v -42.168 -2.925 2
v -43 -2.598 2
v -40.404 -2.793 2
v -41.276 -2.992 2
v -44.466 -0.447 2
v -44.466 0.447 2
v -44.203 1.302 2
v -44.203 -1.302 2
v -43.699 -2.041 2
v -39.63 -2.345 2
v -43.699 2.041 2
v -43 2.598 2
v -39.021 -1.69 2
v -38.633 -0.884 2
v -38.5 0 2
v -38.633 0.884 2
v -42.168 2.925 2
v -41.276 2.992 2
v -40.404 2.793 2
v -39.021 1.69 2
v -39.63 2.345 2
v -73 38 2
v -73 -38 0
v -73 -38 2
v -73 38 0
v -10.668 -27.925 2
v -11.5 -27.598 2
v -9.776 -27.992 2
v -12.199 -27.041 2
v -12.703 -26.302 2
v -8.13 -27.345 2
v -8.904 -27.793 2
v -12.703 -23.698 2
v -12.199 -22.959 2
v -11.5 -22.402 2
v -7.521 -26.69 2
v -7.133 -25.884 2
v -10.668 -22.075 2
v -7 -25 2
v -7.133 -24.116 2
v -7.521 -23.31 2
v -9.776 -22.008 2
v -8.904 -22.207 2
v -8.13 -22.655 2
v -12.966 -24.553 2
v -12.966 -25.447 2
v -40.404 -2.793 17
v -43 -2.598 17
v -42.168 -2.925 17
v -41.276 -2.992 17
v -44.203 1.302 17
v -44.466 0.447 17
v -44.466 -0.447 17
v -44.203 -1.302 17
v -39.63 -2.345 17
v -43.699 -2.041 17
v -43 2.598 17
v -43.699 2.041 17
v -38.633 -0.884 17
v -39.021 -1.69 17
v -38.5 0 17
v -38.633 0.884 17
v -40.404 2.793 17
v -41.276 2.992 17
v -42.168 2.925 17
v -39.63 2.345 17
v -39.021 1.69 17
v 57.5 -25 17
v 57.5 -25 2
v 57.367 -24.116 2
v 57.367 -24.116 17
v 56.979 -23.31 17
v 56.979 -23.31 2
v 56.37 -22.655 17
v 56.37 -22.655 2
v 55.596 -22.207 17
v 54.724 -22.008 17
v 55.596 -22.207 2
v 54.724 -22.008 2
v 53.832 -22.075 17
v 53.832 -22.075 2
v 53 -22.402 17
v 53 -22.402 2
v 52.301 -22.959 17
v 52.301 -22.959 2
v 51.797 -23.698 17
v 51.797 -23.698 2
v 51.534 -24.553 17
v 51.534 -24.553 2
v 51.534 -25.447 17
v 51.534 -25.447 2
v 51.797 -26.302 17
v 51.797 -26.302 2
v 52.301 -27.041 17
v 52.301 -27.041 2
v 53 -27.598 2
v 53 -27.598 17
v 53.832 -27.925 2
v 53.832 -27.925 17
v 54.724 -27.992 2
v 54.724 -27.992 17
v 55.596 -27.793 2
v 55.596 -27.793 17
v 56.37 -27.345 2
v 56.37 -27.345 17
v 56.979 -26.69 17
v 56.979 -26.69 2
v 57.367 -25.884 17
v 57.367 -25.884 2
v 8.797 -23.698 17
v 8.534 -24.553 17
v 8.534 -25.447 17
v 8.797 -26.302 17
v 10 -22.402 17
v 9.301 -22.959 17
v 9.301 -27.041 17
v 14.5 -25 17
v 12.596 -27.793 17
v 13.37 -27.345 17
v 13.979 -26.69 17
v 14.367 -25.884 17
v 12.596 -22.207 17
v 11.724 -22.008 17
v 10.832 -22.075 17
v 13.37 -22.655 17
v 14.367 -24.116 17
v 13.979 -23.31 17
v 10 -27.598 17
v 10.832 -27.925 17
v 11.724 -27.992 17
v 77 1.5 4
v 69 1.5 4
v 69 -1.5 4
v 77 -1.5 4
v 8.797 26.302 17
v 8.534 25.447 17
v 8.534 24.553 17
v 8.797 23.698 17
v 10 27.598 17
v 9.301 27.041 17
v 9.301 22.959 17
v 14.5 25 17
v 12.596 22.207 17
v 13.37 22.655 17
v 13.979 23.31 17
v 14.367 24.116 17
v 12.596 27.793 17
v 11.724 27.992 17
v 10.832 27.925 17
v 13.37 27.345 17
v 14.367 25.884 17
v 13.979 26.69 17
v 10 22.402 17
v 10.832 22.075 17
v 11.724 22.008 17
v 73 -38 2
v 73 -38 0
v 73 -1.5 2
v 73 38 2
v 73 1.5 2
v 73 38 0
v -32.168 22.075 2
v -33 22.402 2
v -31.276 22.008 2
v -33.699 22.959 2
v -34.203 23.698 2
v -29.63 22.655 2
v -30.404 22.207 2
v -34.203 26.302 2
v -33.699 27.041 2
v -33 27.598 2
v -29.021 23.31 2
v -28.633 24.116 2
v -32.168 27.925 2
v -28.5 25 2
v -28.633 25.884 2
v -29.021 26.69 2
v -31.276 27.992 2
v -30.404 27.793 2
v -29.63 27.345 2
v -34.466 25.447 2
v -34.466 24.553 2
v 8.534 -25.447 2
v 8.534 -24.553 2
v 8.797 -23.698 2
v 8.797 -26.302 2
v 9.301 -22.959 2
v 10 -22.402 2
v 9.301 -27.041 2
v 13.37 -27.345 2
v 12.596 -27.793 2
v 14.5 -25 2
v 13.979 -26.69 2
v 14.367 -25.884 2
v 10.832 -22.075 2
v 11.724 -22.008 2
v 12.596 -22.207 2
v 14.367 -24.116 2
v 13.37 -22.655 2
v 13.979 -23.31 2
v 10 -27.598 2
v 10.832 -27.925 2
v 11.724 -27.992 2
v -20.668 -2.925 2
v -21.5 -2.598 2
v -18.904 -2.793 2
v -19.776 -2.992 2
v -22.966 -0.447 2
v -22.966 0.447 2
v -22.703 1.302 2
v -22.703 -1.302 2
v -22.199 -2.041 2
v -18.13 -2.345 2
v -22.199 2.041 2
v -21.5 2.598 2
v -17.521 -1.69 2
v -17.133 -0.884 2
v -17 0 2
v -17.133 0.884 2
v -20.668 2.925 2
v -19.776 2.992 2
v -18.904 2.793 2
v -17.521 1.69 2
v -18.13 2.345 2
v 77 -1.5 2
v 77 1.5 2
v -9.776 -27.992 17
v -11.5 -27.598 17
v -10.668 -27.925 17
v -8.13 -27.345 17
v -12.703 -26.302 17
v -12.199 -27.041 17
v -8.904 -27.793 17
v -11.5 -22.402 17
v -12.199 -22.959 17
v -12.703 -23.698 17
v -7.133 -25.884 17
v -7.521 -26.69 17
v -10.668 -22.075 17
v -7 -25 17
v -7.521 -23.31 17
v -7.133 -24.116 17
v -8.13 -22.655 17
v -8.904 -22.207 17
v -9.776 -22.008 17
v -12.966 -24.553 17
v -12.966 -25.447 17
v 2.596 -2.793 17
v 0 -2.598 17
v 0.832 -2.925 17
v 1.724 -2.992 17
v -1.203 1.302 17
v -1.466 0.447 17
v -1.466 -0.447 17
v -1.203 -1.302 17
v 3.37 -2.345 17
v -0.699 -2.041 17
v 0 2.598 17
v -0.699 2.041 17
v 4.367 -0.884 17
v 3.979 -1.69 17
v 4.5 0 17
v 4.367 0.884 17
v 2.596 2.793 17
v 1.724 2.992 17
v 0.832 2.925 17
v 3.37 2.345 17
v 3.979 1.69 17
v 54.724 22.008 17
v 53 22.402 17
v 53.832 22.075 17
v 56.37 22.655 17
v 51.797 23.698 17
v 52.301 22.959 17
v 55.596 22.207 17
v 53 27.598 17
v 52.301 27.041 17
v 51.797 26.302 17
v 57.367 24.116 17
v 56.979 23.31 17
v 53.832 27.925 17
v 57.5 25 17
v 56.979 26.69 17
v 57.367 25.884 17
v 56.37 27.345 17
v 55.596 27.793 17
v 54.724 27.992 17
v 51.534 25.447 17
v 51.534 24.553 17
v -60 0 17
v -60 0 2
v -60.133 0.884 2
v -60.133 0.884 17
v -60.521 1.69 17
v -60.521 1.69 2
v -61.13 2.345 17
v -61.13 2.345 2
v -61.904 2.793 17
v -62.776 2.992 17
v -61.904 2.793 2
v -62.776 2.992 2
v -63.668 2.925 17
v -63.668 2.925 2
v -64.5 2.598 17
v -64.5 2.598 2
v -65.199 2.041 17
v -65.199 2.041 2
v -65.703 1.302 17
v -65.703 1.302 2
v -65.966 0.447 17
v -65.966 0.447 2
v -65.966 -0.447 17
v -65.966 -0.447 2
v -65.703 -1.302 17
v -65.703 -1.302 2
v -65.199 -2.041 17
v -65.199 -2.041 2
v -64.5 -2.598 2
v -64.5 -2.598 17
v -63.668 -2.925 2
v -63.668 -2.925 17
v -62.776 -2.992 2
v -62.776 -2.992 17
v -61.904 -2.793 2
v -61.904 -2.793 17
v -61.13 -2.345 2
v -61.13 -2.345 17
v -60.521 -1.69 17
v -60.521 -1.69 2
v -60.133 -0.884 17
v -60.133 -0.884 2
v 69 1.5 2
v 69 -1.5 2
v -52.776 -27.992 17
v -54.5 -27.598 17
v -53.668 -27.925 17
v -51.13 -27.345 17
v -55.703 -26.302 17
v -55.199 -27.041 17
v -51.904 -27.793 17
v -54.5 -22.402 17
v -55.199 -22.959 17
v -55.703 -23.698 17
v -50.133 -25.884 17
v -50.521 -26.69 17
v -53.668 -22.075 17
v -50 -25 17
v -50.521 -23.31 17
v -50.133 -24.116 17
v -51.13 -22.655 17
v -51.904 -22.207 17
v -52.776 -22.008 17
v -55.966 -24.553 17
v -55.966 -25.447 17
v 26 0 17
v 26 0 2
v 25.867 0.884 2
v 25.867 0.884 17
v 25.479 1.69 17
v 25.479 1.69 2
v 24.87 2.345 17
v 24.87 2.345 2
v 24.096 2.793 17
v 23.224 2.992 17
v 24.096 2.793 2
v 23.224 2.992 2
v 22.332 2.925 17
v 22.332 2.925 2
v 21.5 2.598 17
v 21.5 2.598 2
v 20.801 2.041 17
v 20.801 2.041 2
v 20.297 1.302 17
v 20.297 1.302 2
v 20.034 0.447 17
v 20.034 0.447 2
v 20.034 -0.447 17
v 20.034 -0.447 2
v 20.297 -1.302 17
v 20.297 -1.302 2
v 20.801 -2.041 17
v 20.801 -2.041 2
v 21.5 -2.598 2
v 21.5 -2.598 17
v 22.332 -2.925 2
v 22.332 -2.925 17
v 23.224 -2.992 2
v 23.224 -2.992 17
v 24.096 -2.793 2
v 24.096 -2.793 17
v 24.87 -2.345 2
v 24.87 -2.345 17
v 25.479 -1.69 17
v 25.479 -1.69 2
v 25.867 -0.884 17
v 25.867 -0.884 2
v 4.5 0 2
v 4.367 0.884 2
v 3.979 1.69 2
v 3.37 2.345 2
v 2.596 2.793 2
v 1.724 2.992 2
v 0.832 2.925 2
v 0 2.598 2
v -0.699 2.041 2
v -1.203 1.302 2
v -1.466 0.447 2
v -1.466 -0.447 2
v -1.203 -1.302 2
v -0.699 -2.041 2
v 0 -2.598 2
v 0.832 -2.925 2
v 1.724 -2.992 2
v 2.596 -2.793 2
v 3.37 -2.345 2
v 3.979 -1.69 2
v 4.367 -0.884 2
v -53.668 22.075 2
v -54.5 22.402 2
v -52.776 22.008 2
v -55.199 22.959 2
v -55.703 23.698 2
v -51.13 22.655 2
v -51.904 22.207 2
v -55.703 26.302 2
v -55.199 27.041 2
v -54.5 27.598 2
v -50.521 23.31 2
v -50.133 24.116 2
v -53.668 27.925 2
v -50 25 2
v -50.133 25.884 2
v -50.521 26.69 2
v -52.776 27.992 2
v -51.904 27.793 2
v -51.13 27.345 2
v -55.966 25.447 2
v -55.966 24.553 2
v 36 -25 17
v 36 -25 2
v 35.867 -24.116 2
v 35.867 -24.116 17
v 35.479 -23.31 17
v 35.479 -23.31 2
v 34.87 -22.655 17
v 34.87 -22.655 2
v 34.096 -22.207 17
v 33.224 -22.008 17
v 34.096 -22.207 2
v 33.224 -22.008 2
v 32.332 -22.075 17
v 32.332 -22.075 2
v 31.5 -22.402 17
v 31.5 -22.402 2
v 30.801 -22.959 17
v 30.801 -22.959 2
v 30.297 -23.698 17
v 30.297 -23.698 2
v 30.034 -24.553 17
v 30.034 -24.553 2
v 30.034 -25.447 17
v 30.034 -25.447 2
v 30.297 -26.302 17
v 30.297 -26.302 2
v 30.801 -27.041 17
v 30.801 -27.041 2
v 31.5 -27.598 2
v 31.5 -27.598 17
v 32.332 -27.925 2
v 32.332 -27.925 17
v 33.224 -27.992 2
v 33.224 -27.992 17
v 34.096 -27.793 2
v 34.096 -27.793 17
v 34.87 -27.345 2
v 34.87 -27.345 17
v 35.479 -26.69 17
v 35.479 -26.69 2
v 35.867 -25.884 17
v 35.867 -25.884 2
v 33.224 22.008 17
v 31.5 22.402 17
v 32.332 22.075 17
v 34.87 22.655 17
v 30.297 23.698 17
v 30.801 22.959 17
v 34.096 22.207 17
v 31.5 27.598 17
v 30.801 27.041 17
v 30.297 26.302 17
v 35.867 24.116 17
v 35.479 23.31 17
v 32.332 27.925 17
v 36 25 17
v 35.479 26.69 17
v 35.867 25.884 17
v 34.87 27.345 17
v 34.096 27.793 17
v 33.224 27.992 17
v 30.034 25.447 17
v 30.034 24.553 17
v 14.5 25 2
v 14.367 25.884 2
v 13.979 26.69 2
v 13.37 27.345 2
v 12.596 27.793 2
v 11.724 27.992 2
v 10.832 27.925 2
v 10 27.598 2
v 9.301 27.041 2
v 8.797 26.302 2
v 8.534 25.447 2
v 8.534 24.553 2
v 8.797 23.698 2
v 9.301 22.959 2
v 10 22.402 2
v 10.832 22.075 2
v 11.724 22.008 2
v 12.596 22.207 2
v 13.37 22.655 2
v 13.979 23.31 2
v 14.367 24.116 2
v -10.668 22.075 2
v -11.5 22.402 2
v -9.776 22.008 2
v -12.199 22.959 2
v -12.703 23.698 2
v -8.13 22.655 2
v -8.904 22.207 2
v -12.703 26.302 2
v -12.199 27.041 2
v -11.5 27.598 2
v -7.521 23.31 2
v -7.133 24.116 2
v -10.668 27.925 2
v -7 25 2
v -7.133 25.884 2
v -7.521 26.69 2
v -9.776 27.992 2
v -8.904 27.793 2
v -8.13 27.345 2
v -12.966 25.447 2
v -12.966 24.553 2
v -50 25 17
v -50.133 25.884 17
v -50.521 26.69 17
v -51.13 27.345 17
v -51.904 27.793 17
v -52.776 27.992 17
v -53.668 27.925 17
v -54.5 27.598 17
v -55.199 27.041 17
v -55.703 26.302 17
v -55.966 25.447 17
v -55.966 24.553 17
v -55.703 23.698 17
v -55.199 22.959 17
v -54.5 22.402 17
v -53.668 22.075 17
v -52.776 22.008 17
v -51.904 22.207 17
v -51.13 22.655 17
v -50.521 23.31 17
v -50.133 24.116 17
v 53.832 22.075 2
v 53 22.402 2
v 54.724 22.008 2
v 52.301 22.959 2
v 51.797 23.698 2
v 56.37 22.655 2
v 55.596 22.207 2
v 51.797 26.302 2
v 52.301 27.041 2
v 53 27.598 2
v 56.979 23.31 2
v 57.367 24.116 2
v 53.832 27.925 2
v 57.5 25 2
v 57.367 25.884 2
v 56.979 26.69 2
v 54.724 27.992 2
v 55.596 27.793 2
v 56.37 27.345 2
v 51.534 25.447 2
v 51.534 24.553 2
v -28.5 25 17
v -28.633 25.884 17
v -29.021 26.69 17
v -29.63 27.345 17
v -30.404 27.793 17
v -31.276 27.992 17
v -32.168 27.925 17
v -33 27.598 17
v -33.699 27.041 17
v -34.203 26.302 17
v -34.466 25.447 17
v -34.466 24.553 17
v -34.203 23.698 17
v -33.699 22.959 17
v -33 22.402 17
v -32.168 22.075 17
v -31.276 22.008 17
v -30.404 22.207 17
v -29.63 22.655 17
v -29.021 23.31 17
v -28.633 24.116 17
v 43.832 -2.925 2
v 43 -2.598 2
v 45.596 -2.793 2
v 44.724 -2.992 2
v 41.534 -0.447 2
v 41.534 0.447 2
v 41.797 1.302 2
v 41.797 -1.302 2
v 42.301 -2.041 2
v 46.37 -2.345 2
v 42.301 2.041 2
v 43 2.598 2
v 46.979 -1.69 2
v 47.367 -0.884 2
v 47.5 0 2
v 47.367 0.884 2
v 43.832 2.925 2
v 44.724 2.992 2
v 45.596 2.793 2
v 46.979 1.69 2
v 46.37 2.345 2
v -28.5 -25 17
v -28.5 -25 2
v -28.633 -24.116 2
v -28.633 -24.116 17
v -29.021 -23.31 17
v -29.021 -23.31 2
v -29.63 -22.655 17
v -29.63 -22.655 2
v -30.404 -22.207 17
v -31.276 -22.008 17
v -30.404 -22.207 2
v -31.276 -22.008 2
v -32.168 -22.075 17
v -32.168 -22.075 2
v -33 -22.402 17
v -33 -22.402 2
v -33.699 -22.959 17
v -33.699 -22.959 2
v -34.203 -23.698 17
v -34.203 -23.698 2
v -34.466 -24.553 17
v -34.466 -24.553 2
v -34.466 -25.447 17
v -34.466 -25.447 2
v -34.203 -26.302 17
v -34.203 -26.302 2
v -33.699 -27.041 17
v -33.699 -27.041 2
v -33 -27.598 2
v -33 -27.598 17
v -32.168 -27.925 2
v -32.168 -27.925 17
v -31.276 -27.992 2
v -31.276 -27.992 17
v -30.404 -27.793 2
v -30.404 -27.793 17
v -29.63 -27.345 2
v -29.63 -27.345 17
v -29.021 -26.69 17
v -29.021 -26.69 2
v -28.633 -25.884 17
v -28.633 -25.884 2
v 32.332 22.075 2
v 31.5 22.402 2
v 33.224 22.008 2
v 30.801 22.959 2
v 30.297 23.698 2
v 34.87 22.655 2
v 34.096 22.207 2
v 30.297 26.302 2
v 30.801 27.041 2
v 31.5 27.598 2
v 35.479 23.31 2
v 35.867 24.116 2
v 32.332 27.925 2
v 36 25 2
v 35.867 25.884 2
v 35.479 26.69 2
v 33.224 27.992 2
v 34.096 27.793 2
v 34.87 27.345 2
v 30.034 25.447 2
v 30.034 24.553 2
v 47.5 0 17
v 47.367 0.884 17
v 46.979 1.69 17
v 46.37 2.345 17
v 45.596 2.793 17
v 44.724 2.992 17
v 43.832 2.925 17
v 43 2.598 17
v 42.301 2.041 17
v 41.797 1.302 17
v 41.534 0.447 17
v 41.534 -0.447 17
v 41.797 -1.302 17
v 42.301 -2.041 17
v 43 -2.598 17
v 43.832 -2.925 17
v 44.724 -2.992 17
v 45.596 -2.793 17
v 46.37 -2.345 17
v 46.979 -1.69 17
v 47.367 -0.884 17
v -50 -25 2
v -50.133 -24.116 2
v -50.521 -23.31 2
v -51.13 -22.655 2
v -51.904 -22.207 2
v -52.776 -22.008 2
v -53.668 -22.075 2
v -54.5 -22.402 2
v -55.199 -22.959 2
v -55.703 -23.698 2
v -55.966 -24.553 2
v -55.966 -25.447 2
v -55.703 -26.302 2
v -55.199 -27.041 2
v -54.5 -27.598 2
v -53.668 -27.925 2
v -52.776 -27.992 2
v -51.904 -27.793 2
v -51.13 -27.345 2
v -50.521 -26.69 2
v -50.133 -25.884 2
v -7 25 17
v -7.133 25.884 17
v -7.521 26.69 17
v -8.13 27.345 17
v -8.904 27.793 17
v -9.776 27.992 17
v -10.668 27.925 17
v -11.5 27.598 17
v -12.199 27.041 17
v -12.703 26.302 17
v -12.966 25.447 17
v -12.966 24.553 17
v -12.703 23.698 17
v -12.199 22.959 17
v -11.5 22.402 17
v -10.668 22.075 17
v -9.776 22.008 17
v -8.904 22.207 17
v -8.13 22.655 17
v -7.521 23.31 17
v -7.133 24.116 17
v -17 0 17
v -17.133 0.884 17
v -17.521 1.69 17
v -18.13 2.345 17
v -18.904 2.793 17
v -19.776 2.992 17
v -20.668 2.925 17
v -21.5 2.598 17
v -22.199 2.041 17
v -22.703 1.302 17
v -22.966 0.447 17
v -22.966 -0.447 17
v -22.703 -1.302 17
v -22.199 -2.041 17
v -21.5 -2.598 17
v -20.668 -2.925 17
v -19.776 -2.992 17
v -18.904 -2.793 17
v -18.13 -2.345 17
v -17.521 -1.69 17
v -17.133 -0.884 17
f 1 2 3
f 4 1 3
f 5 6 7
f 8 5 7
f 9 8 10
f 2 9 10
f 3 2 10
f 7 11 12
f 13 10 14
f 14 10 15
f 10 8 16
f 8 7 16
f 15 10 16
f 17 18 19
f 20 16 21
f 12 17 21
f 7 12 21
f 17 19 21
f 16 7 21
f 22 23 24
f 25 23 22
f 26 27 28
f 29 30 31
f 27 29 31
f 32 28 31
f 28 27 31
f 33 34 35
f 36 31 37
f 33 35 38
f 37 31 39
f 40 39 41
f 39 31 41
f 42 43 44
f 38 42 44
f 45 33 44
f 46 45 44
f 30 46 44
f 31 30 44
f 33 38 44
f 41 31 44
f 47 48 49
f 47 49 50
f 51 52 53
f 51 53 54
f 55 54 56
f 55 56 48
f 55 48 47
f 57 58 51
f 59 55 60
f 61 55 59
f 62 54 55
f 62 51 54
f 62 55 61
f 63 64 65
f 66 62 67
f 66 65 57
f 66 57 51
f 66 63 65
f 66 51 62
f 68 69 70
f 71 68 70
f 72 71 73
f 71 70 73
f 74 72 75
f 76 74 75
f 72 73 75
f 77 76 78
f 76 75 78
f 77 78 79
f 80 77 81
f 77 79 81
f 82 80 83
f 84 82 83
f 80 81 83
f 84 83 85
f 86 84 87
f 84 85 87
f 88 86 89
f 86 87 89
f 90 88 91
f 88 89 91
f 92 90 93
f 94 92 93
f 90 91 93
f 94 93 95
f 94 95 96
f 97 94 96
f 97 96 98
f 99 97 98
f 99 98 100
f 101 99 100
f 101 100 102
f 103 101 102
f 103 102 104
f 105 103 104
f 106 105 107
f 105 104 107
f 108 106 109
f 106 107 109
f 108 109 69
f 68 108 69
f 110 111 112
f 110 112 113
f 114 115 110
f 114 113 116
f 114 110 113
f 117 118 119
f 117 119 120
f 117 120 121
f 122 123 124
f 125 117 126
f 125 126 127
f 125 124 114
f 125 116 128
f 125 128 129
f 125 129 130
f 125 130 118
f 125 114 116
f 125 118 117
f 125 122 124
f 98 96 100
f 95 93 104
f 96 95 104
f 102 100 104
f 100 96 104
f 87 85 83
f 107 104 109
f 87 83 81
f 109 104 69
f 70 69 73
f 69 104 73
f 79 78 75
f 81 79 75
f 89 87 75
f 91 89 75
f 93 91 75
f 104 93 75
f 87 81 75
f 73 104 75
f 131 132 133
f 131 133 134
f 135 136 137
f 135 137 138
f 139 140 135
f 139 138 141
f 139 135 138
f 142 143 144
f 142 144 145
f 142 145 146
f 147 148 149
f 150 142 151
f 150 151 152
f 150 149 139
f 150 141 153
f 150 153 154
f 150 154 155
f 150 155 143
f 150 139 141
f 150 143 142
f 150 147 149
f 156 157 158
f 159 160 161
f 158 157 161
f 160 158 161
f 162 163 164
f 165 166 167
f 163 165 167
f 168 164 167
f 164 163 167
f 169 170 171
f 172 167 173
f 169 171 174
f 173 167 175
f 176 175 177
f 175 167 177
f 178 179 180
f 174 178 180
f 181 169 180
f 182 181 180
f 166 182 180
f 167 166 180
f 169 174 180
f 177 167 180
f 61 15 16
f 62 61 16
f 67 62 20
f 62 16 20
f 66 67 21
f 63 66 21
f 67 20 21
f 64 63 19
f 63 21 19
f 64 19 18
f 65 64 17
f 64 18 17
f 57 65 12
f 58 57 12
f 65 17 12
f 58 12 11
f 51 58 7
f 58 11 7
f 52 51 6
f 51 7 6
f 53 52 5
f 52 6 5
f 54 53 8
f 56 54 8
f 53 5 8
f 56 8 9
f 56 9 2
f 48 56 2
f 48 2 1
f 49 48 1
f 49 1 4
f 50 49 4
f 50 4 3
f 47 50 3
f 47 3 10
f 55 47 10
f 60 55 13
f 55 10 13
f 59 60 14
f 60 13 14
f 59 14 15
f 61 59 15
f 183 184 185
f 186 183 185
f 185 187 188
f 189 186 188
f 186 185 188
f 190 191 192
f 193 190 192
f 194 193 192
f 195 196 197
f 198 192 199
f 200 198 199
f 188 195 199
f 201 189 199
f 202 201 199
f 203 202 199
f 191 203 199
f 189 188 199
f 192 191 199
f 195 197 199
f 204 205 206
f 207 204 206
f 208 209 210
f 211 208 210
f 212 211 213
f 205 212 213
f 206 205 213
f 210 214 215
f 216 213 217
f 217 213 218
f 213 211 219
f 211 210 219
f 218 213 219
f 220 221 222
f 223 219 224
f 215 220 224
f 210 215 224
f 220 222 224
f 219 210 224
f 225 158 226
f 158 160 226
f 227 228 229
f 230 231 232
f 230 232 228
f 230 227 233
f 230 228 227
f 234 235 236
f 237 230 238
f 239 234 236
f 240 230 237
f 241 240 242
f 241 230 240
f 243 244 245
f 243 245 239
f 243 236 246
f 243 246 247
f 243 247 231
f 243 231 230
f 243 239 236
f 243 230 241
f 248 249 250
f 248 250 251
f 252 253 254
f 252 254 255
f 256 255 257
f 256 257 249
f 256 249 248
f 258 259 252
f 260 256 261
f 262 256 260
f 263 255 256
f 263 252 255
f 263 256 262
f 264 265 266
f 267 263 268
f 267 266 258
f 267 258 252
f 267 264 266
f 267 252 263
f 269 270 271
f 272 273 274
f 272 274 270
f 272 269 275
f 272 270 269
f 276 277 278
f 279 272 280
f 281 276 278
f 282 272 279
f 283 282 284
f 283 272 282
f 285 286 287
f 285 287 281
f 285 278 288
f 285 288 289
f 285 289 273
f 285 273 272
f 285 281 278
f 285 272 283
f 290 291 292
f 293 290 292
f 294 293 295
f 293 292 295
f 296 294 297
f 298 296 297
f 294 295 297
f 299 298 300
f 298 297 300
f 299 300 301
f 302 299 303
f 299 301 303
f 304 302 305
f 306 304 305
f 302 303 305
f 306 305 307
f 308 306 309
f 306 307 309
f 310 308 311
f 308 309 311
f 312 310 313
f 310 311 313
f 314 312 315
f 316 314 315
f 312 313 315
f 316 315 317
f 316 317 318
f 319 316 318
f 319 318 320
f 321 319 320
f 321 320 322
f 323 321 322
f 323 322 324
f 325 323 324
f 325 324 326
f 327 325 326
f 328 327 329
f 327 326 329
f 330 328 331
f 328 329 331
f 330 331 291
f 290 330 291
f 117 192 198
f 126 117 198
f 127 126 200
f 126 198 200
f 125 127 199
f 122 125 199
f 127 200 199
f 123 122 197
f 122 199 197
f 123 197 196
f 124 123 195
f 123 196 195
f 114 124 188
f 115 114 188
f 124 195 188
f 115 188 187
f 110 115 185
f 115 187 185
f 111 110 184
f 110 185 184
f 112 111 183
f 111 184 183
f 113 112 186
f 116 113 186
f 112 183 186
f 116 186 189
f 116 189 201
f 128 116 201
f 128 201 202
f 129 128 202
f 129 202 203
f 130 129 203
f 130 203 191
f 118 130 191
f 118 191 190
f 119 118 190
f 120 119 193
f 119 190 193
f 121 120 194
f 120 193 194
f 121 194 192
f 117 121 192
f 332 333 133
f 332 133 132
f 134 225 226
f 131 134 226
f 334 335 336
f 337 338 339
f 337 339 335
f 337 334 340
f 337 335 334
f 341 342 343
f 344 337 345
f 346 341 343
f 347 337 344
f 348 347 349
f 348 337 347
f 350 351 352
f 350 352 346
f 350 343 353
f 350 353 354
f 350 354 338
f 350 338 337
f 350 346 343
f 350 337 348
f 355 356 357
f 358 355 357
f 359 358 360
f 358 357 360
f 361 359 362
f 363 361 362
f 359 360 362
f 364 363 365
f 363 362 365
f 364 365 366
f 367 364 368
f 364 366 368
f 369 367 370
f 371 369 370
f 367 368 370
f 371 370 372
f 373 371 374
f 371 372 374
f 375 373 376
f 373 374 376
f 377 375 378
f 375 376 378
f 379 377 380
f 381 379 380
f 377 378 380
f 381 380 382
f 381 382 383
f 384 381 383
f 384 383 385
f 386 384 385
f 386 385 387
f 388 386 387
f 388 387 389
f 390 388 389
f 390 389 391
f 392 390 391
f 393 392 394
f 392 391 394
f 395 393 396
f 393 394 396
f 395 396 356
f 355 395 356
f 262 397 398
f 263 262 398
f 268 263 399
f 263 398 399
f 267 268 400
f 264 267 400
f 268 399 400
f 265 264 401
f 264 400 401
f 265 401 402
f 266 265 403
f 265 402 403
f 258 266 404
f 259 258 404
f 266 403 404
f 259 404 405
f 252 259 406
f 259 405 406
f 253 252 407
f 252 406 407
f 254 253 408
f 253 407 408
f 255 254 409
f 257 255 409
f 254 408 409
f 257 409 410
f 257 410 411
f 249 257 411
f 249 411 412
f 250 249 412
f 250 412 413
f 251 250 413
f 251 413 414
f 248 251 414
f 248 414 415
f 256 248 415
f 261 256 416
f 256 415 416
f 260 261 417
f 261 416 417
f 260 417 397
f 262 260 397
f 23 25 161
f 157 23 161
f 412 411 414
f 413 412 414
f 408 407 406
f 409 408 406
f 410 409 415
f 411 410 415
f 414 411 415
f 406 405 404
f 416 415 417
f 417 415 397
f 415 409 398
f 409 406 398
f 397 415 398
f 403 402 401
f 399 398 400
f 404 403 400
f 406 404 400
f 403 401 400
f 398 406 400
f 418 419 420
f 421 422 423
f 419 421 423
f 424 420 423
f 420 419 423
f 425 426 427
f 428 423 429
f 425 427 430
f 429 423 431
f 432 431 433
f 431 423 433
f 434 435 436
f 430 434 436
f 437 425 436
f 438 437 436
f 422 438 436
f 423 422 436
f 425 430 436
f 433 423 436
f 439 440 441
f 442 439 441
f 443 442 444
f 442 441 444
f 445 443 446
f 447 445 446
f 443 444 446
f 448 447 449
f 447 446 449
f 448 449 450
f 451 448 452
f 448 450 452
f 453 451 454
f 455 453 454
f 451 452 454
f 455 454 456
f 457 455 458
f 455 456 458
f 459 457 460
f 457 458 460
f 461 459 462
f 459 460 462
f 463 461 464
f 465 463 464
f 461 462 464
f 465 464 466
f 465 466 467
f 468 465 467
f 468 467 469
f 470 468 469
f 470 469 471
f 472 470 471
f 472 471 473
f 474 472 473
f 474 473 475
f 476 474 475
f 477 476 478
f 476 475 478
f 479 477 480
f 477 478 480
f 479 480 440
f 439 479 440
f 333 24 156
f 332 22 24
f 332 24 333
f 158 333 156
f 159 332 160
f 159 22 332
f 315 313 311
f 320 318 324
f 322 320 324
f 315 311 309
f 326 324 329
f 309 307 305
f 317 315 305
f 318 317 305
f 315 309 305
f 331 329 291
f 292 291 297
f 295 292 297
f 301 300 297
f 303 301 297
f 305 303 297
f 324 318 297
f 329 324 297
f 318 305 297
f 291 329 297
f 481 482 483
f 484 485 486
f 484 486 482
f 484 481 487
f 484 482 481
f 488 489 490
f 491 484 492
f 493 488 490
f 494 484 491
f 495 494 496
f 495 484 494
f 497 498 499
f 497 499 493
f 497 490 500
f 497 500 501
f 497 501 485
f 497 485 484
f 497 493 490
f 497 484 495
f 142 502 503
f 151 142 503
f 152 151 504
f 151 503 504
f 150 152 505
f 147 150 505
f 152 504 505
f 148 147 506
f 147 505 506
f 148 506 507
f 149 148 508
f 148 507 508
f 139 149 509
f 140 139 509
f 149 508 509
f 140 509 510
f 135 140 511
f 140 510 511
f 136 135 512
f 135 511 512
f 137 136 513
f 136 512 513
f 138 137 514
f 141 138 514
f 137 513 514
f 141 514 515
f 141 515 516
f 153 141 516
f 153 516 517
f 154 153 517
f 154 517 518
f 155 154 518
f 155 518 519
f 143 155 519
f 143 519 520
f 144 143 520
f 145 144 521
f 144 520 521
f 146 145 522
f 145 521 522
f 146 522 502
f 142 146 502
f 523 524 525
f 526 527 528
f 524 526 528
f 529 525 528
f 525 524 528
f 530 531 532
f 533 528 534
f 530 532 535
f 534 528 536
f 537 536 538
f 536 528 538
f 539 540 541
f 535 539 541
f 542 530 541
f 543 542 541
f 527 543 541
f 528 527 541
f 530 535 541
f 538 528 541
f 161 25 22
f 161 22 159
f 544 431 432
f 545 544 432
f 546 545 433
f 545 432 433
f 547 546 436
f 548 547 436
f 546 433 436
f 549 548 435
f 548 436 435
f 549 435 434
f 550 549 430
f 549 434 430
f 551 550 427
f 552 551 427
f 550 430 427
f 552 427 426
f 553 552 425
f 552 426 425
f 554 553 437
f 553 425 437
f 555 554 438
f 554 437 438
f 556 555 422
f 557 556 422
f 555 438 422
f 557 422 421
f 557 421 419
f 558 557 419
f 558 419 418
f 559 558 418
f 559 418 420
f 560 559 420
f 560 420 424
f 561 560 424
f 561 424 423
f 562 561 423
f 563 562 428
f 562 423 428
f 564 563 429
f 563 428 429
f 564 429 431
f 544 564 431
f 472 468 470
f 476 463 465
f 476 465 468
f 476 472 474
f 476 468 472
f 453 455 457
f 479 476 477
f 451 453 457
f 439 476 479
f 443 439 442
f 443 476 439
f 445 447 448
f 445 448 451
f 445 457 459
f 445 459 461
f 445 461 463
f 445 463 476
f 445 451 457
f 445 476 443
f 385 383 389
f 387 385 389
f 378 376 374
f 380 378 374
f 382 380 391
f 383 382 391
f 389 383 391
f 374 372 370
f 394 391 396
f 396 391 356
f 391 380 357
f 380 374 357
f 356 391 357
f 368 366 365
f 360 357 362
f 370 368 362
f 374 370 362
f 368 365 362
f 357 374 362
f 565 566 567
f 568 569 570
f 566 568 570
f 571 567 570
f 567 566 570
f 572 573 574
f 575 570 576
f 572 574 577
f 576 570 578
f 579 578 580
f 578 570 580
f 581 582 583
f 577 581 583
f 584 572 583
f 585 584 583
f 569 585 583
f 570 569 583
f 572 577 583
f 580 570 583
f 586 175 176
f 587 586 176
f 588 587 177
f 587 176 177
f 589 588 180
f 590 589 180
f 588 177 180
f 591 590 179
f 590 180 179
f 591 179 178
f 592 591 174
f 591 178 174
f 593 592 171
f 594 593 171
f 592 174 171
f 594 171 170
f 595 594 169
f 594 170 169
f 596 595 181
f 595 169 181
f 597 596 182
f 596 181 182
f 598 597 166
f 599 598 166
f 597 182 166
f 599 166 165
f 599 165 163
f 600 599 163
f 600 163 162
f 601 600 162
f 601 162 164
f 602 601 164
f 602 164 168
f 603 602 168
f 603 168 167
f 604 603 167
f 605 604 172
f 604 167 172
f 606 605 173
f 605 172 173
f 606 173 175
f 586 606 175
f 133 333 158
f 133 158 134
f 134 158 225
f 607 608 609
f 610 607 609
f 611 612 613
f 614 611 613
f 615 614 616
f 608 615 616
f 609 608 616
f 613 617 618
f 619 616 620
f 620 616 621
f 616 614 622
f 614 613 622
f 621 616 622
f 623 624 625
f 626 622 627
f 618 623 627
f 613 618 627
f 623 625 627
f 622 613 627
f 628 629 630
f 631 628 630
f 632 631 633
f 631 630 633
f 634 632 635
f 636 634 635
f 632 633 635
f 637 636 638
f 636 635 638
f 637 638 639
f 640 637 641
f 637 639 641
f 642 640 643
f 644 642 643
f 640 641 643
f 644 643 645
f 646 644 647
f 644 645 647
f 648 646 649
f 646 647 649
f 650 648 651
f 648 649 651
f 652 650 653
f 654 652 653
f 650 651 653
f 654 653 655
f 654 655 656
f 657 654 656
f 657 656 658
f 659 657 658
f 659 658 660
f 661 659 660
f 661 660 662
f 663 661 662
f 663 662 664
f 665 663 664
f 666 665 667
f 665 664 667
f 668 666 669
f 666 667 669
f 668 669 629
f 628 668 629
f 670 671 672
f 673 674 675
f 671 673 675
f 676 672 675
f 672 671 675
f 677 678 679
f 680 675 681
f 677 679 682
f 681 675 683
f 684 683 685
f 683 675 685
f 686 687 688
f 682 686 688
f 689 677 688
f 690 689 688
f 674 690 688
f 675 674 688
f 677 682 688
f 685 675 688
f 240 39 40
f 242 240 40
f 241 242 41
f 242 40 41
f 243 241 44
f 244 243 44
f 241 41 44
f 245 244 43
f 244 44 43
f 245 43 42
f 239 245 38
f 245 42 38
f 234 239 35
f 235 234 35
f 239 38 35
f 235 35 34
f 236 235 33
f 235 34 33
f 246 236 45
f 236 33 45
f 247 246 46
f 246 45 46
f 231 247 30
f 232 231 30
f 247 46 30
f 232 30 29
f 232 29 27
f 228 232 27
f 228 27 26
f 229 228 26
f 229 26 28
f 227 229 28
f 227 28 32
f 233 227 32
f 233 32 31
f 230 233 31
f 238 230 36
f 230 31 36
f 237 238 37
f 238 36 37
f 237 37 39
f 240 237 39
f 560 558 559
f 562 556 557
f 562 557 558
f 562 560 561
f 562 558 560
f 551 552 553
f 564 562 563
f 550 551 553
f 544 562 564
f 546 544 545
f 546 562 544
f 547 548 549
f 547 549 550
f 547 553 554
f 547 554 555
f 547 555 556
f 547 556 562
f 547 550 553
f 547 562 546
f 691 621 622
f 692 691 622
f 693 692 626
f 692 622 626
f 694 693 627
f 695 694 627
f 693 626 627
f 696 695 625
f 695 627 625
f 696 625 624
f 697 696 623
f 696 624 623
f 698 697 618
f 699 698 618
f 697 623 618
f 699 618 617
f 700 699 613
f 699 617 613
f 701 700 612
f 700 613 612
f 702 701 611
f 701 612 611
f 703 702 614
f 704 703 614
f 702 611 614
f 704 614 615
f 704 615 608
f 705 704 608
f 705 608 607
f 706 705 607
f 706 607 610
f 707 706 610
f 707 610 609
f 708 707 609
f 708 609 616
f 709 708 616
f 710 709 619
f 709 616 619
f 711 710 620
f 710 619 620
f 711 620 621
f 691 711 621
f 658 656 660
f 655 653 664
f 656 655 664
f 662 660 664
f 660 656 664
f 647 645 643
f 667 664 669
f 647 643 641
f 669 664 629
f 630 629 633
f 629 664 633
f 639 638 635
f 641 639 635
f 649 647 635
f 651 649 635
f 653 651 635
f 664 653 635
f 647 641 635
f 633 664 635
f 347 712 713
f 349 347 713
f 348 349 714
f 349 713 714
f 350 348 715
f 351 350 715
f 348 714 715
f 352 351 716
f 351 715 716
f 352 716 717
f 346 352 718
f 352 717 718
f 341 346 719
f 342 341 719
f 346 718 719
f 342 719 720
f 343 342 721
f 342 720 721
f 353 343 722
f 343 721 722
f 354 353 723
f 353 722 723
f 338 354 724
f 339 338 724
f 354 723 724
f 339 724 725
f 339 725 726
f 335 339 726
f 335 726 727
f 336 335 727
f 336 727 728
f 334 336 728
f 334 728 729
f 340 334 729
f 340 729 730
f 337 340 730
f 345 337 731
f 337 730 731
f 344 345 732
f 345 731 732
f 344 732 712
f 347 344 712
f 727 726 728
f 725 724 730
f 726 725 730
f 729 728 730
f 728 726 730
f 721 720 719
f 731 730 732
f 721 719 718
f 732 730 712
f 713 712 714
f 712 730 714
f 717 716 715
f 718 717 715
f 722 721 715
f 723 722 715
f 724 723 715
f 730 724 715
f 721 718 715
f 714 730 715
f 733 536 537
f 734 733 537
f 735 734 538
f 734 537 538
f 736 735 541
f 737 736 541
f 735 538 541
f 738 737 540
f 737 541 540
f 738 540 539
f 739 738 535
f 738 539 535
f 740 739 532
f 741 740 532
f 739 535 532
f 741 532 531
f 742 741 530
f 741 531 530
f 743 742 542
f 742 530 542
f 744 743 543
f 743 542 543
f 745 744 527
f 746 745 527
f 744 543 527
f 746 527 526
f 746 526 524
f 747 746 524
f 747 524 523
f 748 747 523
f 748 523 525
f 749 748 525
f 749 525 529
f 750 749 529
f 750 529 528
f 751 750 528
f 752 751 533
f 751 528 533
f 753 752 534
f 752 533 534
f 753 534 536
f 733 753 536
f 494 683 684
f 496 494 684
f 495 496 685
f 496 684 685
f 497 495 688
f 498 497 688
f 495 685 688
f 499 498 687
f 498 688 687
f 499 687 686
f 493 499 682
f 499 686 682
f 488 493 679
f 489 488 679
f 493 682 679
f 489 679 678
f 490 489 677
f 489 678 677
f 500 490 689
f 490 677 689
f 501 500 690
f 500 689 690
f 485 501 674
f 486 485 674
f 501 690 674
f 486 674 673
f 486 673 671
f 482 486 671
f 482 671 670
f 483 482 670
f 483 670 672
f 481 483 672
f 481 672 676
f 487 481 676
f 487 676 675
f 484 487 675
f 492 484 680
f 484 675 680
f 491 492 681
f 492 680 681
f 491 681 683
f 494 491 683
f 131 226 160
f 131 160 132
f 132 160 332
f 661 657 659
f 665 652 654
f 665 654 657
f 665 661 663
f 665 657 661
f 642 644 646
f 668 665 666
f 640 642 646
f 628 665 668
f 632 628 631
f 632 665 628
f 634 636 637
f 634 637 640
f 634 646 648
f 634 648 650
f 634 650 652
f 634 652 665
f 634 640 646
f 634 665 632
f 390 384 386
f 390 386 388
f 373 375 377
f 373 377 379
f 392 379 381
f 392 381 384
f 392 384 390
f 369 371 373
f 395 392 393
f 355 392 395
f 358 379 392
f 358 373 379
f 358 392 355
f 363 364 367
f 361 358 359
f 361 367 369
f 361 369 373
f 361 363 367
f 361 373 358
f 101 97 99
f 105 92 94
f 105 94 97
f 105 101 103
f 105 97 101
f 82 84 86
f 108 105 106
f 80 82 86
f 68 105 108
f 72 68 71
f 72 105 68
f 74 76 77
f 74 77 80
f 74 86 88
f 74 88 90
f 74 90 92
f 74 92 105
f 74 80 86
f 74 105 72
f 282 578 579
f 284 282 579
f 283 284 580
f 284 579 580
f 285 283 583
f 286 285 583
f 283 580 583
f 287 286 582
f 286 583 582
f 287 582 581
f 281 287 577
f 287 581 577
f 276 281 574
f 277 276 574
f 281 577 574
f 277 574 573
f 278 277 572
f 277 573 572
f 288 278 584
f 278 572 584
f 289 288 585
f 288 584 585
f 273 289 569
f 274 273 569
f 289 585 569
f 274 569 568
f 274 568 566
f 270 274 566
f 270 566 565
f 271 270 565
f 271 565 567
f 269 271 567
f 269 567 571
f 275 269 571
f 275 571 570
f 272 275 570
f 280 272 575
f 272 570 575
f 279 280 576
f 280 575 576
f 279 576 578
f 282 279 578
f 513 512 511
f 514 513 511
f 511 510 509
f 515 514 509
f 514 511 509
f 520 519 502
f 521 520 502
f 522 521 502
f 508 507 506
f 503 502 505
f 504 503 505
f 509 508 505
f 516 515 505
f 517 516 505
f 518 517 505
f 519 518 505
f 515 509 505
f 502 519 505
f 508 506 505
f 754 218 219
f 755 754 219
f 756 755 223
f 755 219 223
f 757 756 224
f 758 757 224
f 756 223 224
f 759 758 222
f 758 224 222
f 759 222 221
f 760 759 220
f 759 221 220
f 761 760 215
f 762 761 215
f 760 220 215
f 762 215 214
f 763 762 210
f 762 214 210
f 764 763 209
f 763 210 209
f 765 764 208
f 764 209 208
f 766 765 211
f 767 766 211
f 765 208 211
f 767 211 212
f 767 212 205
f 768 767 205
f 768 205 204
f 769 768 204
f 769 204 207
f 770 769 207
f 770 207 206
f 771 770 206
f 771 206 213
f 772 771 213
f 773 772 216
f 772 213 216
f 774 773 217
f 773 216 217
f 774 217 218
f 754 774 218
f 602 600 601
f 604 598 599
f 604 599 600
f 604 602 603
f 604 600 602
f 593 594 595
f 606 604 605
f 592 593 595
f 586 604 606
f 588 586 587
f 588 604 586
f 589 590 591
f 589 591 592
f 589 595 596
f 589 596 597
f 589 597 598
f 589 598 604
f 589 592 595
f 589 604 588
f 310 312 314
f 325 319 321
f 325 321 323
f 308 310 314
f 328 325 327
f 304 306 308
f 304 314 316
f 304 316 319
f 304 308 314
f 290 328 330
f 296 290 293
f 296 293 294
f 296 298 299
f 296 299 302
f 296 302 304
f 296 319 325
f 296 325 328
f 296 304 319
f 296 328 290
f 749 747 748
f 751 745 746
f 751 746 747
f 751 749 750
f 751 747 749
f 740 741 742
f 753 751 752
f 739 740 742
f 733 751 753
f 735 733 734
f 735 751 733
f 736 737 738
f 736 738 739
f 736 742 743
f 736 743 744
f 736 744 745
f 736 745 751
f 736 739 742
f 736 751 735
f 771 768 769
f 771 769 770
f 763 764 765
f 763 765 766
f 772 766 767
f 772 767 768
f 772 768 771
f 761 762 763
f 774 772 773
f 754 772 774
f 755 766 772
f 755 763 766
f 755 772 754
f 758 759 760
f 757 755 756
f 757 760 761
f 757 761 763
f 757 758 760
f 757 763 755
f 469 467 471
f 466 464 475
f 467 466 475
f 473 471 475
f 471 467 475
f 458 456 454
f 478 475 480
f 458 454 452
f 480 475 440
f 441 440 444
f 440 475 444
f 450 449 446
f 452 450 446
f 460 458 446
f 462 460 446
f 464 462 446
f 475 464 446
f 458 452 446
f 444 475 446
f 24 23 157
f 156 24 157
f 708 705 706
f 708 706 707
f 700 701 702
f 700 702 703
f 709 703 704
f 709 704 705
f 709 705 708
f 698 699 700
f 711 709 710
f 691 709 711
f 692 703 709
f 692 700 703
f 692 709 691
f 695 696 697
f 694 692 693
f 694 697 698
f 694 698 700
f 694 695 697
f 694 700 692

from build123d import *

# Parameters (mm, degrees)
F0_W     = 146
F0_H     = 76
F1_DEPTH = 2
F2_R     = 3
F3_DEPTH = 15
F4_DEPTH = 15
F2_W     = 4
F2_H     = 3
F5_DEPTH = 2


with BuildPart() as f1:
    # F0 (on Top) → F1 (new body)
    with BuildSketch(Plane.XY):
        Rectangle(F0_W, F0_H)
    extrude(amount=F1_DEPTH)

    # F2 (on face) → F5 (join)
    with BuildSketch(Plane.XY.offset(2)):
        with Locations((75, 0)):
            Rectangle(F2_W, F2_H)
        with Locations((71, 0)):
            Rectangle(F2_W, F2_H)
    extrude(amount=F5_DEPTH)


with BuildPart() as f3:
    # F2 (on face) → F3 (new body)
    with BuildSketch(Plane.XY.offset(2)):
        with Locations((-53, 25)):
            Circle(F2_R)
        with Locations((-31.5, 25)):
            Circle(F2_R)
        with Locations((-10, 25)):
            Circle(F2_R)
        with Locations((11.5, 25)):
            Circle(F2_R)
        with Locations((33, 25)):
            Circle(F2_R)
        with Locations((54.5, 25)):
            Circle(F2_R)
        with Locations((54.5, -25)):
            Circle(F2_R)
        with Locations((33, -25)):
            Circle(F2_R)
        with Locations((11.5, -25)):
            Circle(F2_R)
        with Locations((-10, -25)):
            Circle(F2_R)
        with Locations((-31.5, -25)):
            Circle(F2_R)
        with Locations((-53, -25)):
            Circle(F2_R)
    extrude(amount=F3_DEPTH)


with BuildPart() as f4:
    # F2 (on face) → F4 (new body)
    with BuildSketch(Plane.XY.offset(2)):
        with Locations((-63, 0)):
            Circle(F2_R)
        with Locations((-41.5, 0)):
            Circle(F2_R)
        with Locations((-20, 0)):
            Circle(F2_R)
        with Locations((1.5, 0)):
            Circle(F2_R)
        with Locations((23, 0)):
            Circle(F2_R)
        with Locations((44.5, 0)):
            Circle(F2_R)
    extrude(amount=F4_DEPTH)


solid = Compound([f1.part, f3.part, f4.part])
